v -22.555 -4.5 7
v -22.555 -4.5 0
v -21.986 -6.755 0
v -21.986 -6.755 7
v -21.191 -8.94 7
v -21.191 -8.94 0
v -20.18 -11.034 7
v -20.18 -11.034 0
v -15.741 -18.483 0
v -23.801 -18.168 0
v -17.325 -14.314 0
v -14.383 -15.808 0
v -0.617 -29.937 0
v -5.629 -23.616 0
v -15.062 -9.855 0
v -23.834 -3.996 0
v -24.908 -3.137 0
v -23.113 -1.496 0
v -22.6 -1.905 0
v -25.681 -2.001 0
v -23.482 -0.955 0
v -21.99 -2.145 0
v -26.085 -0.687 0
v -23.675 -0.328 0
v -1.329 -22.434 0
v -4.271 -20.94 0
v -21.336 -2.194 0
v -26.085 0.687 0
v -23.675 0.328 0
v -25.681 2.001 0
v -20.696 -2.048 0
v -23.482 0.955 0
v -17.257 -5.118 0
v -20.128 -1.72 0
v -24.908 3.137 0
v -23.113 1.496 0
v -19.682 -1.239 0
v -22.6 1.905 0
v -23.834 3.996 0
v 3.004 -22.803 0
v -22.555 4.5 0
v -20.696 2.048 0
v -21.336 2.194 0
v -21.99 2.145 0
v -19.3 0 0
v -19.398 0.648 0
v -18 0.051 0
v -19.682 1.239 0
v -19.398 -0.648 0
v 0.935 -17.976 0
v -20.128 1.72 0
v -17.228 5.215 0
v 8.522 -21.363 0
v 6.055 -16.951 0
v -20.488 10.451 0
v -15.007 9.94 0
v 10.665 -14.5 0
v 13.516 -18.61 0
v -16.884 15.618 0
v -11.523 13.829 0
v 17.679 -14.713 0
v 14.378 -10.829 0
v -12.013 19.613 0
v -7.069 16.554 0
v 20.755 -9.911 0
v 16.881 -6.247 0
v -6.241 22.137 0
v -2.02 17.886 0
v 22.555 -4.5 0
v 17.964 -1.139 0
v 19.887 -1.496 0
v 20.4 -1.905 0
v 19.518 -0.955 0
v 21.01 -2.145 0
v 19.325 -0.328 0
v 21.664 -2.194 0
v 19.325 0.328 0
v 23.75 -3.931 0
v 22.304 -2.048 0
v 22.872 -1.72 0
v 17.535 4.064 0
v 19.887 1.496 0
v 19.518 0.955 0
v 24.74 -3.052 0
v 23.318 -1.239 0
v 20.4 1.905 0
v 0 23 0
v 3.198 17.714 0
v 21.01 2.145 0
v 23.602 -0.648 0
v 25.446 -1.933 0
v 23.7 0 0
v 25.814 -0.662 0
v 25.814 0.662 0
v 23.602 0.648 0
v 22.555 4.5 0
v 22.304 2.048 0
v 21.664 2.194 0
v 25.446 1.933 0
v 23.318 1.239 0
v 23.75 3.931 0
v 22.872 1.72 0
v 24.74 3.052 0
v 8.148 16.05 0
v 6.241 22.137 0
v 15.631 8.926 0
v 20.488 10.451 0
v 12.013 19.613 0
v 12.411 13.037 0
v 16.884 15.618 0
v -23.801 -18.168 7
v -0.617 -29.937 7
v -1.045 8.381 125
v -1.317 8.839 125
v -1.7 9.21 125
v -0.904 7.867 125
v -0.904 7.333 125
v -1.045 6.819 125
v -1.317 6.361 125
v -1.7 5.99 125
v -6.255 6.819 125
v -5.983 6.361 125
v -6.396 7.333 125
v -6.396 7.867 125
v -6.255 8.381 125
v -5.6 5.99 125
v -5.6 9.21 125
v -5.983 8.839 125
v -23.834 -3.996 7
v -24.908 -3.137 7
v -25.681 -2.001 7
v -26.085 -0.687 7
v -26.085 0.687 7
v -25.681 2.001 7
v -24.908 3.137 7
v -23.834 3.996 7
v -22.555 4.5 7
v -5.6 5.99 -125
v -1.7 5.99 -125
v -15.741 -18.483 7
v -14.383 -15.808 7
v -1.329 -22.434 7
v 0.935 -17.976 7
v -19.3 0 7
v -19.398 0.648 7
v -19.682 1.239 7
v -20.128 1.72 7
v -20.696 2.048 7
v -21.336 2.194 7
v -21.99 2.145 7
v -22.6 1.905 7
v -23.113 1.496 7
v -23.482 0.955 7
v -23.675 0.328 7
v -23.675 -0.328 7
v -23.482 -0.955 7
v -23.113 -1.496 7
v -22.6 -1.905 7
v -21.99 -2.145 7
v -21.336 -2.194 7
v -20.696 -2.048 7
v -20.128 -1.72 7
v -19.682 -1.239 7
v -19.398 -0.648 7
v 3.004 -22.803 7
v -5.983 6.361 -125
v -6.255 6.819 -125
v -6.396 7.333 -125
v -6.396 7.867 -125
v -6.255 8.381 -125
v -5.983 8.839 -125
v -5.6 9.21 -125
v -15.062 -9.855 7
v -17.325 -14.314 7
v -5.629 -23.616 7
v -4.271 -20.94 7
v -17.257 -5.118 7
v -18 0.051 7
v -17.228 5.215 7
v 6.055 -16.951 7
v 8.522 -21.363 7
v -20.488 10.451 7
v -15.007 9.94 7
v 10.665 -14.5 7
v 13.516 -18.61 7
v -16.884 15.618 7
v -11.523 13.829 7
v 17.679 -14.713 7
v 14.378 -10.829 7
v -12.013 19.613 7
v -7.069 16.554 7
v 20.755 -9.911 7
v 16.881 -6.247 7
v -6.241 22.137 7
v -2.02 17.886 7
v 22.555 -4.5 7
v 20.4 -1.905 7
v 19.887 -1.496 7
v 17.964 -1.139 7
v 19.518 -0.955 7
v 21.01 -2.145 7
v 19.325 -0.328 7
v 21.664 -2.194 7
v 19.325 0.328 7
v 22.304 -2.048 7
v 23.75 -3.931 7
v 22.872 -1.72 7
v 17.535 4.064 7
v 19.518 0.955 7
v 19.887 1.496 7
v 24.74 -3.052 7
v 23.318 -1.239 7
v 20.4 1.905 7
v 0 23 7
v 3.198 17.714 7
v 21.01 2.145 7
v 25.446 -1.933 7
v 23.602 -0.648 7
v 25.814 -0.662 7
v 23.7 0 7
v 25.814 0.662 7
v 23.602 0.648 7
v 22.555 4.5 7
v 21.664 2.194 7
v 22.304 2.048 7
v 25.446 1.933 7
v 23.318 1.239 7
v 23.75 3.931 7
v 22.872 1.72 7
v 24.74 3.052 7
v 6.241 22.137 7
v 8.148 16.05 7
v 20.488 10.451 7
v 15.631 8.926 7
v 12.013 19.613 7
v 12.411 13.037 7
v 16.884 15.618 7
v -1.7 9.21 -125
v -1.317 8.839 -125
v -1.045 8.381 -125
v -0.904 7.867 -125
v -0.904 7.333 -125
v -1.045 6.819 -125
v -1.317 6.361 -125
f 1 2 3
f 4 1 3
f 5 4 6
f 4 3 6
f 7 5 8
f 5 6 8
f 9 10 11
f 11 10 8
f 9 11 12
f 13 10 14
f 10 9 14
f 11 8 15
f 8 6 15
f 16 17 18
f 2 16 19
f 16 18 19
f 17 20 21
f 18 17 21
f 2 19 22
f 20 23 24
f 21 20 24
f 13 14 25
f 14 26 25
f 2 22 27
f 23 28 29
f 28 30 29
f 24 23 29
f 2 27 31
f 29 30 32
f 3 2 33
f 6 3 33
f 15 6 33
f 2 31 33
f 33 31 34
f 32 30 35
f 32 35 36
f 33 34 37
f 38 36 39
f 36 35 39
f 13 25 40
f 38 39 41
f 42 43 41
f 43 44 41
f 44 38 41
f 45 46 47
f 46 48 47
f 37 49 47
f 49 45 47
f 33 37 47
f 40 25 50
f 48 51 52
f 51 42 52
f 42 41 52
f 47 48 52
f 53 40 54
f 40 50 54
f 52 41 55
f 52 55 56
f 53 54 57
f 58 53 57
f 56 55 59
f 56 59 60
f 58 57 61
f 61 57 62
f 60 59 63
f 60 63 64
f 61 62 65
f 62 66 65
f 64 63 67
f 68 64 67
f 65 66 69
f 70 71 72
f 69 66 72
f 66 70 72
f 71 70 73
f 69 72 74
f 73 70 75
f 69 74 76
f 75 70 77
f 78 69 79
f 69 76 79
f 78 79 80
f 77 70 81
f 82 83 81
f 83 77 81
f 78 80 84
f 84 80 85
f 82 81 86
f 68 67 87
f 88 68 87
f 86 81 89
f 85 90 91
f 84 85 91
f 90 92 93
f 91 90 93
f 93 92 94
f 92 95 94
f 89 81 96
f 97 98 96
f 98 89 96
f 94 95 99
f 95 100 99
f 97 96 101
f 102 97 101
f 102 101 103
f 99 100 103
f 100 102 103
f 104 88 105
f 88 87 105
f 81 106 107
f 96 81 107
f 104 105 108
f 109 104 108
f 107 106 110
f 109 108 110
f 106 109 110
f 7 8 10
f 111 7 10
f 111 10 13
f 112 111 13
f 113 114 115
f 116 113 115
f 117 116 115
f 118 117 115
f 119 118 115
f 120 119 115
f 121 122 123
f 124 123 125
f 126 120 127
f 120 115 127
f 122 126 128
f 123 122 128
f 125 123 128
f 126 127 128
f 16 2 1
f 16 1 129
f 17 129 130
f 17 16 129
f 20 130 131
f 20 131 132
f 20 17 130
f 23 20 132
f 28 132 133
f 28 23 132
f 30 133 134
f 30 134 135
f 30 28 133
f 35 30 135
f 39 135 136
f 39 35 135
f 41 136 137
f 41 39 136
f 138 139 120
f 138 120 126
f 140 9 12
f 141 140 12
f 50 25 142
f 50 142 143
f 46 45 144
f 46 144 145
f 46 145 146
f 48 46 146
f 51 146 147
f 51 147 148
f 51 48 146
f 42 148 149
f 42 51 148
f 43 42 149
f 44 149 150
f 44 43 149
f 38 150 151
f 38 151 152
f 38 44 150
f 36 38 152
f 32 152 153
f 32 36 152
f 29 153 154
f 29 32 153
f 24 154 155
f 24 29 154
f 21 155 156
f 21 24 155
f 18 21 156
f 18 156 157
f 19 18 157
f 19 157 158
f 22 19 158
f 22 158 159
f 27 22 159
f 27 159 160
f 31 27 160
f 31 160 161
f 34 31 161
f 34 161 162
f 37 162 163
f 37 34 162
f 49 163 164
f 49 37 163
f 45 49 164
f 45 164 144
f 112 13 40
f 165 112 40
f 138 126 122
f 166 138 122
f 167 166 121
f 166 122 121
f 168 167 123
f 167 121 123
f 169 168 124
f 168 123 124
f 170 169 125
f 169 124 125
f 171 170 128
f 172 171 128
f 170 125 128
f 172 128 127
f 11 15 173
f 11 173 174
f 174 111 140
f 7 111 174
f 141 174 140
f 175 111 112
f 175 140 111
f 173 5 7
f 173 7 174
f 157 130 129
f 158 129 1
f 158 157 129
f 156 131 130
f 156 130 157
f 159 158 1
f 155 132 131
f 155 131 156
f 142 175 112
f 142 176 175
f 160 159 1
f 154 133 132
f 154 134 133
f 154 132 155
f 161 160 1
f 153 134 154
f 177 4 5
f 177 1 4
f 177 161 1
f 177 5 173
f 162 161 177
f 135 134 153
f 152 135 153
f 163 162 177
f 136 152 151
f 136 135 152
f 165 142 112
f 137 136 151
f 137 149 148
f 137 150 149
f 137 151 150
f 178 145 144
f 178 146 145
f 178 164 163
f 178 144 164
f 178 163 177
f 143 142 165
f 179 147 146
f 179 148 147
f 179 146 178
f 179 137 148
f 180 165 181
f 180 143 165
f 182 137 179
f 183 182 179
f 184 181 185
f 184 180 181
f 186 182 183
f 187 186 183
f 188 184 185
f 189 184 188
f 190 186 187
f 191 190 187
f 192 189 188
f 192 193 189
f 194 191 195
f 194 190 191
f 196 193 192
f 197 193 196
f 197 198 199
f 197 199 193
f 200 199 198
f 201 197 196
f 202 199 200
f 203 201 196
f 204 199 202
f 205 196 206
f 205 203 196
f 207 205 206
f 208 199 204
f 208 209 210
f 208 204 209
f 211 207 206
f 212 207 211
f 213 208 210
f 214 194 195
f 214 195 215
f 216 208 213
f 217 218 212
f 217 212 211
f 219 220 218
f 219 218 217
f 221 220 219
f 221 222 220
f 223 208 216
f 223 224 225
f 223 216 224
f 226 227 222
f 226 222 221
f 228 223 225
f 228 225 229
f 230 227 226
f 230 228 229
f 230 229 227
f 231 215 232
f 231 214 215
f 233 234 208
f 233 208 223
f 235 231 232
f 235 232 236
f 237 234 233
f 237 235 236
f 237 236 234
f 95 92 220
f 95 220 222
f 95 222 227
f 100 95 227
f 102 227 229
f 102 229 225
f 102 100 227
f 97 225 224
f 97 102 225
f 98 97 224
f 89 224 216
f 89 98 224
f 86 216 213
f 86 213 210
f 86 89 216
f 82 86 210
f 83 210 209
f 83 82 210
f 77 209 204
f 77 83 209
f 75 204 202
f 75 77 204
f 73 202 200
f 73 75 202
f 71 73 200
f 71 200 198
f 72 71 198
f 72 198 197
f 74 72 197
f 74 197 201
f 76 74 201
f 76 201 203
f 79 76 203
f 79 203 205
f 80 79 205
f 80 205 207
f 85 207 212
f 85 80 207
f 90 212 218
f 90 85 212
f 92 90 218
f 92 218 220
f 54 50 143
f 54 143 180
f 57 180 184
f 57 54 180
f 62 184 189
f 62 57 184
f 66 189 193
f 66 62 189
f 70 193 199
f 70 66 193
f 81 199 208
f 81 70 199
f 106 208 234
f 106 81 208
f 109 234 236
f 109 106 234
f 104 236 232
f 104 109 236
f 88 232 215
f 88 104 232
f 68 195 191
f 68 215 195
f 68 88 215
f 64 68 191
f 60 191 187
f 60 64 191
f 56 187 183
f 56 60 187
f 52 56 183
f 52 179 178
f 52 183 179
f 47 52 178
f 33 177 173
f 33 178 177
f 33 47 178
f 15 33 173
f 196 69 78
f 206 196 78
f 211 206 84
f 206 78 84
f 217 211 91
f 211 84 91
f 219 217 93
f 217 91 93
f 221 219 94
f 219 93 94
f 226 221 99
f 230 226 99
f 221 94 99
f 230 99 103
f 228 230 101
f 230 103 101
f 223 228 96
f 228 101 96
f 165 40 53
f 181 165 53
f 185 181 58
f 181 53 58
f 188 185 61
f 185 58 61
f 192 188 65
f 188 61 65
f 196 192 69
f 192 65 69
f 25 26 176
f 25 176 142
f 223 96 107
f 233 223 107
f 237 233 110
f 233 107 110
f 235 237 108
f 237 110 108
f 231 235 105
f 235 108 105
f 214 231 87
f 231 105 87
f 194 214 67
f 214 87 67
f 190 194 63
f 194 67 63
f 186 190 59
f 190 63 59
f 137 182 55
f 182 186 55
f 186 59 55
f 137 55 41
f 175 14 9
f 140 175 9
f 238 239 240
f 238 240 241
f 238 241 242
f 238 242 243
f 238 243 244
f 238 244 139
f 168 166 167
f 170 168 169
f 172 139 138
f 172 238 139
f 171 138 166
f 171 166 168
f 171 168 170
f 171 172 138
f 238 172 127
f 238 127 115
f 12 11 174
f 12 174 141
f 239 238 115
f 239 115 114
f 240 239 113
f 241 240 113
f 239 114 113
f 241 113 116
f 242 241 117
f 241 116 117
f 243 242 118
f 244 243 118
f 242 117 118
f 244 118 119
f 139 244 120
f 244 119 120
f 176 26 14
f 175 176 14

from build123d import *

# Parameters (mm, degrees)
SKETCH1_R           = 23
SKETCH1_R_2         = 18
BOSS_EXTRUDE1_DEPTH = 7
BOSS_EXTRUDE2_DEPTH = 7
CUT_EXTRUDE1_DEPTH  = 7
BOSS_EXTRUDE3_DEPTH = 7
SKETCH7_R           = 2.2
CUT_EXTRUDE2_DEPTH  = 7
CUT_EXTRUDE3_DEPTH  = 7
BOSS_EXTRUDE4_DEPTH = 125


with BuildPart() as part:
    # Sketch1 → Boss-Extrude1 (new body)
    with BuildSketch(Plane.XY):
        Circle(SKETCH1_R)
        Circle(SKETCH1_R_2, mode=Mode.SUBTRACT)
    extrude(amount=BOSS_EXTRUDE1_DEPTH)

    # Sketch3 → Boss-Extrude2 (add)
    with BuildSketch(Plane.XY):
        with BuildLine():
            Line((-23.80139919, -18.167885182), (-0.617388595, -29.936557696))
            Line((-0.617388595, -29.936557696), (3.003741409, -22.803015975))
            ThreePointArc((3.003741409, -22.803015975), (-10.410748762, -20.508932449), (-20.180269185, -11.034343461))
            Line((-20.180269185, -11.034343461), (-23.80139919, -18.167885182))
        make_face()
    extrude(amount=BOSS_EXTRUDE2_DEPTH)

    # Sketch5 → Cut-Extrude1 (cut)
    with BuildSketch(Plane.XY):
        with BuildLine():
            Line((-15.062285021, -9.855332057), (-17.325491273, -14.313795633))
            Line((-17.325491273, -14.313795633), (-1.328523963, -22.434179668))
            Line((-1.328523963, -22.434179668), (0.93468229, -17.975716092))
            ThreePointArc((0.93468229, -17.975716092), (-8.14754251, -16.050468873), (-15.062285021, -9.855332057))
        make_face()
    extrude(amount=CUT_EXTRUDE1_DEPTH, mode=Mode.SUBTRACT)

    # Sketch6 → Boss-Extrude3 (add)
    with BuildSketch(Plane.XY):
        with BuildLine():
            ThreePointArc((-22.555487137, -4.5), (-26.136916399, 0), (-22.555487137, 4.5))
            ThreePointArc((-22.555487137, 4.5), (-23, 0), (-22.555487137, -4.5))
        make_face()
        with BuildLine():
            ThreePointArc((22.555487137, -4.5), (25.860234666, 0), (22.555487137, 4.5))
            ThreePointArc((22.555487137, 4.5), (23, 0), (22.555487137, -4.5))
        make_face()
    extrude(amount=BOSS_EXTRUDE3_DEPTH)

    # Sketch7 → Cut-Extrude2 (cut)
    with BuildSketch(Plane.XY):
        with Locations((-21.5, 0)):
            Circle(SKETCH7_R)
        with Locations((21.5, 0)):
            Circle(SKETCH7_R)
    extrude(amount=CUT_EXTRUDE2_DEPTH, mode=Mode.SUBTRACT)

    # Sketch8 → Cut-Extrude3 (cut)
    with BuildSketch(Plane.XY):
        Polygon((-14.382905313, -15.80751176), (-4.271109923, -20.940463541), (-5.629033675, -23.615541687), (-15.740829065, -18.482589905), align=None)
    extrude(amount=CUT_EXTRUDE3_DEPTH, mode=Mode.SUBTRACT)


with BuildPart() as body_2:
    # Sketch9 → Boss-Extrude4 (new, symmetric)
    with BuildSketch(Plane.XY):
        with BuildLine():
            Line((-5.6, 9.21), (-1.7, 9.21))
            ThreePointArc((-1.7, 9.21), (-0.88654962, 7.6), (-1.7, 5.99))
            Line((-1.7, 5.99), (-5.6, 5.99))
            ThreePointArc((-5.6, 5.99), (-6.41345038, 7.6), (-5.6, 9.21))
        make_face()
    extrude(amount=BOSS_EXTRUDE4_DEPTH, both=True)


solid = Compound([part.part, body_2.part])
